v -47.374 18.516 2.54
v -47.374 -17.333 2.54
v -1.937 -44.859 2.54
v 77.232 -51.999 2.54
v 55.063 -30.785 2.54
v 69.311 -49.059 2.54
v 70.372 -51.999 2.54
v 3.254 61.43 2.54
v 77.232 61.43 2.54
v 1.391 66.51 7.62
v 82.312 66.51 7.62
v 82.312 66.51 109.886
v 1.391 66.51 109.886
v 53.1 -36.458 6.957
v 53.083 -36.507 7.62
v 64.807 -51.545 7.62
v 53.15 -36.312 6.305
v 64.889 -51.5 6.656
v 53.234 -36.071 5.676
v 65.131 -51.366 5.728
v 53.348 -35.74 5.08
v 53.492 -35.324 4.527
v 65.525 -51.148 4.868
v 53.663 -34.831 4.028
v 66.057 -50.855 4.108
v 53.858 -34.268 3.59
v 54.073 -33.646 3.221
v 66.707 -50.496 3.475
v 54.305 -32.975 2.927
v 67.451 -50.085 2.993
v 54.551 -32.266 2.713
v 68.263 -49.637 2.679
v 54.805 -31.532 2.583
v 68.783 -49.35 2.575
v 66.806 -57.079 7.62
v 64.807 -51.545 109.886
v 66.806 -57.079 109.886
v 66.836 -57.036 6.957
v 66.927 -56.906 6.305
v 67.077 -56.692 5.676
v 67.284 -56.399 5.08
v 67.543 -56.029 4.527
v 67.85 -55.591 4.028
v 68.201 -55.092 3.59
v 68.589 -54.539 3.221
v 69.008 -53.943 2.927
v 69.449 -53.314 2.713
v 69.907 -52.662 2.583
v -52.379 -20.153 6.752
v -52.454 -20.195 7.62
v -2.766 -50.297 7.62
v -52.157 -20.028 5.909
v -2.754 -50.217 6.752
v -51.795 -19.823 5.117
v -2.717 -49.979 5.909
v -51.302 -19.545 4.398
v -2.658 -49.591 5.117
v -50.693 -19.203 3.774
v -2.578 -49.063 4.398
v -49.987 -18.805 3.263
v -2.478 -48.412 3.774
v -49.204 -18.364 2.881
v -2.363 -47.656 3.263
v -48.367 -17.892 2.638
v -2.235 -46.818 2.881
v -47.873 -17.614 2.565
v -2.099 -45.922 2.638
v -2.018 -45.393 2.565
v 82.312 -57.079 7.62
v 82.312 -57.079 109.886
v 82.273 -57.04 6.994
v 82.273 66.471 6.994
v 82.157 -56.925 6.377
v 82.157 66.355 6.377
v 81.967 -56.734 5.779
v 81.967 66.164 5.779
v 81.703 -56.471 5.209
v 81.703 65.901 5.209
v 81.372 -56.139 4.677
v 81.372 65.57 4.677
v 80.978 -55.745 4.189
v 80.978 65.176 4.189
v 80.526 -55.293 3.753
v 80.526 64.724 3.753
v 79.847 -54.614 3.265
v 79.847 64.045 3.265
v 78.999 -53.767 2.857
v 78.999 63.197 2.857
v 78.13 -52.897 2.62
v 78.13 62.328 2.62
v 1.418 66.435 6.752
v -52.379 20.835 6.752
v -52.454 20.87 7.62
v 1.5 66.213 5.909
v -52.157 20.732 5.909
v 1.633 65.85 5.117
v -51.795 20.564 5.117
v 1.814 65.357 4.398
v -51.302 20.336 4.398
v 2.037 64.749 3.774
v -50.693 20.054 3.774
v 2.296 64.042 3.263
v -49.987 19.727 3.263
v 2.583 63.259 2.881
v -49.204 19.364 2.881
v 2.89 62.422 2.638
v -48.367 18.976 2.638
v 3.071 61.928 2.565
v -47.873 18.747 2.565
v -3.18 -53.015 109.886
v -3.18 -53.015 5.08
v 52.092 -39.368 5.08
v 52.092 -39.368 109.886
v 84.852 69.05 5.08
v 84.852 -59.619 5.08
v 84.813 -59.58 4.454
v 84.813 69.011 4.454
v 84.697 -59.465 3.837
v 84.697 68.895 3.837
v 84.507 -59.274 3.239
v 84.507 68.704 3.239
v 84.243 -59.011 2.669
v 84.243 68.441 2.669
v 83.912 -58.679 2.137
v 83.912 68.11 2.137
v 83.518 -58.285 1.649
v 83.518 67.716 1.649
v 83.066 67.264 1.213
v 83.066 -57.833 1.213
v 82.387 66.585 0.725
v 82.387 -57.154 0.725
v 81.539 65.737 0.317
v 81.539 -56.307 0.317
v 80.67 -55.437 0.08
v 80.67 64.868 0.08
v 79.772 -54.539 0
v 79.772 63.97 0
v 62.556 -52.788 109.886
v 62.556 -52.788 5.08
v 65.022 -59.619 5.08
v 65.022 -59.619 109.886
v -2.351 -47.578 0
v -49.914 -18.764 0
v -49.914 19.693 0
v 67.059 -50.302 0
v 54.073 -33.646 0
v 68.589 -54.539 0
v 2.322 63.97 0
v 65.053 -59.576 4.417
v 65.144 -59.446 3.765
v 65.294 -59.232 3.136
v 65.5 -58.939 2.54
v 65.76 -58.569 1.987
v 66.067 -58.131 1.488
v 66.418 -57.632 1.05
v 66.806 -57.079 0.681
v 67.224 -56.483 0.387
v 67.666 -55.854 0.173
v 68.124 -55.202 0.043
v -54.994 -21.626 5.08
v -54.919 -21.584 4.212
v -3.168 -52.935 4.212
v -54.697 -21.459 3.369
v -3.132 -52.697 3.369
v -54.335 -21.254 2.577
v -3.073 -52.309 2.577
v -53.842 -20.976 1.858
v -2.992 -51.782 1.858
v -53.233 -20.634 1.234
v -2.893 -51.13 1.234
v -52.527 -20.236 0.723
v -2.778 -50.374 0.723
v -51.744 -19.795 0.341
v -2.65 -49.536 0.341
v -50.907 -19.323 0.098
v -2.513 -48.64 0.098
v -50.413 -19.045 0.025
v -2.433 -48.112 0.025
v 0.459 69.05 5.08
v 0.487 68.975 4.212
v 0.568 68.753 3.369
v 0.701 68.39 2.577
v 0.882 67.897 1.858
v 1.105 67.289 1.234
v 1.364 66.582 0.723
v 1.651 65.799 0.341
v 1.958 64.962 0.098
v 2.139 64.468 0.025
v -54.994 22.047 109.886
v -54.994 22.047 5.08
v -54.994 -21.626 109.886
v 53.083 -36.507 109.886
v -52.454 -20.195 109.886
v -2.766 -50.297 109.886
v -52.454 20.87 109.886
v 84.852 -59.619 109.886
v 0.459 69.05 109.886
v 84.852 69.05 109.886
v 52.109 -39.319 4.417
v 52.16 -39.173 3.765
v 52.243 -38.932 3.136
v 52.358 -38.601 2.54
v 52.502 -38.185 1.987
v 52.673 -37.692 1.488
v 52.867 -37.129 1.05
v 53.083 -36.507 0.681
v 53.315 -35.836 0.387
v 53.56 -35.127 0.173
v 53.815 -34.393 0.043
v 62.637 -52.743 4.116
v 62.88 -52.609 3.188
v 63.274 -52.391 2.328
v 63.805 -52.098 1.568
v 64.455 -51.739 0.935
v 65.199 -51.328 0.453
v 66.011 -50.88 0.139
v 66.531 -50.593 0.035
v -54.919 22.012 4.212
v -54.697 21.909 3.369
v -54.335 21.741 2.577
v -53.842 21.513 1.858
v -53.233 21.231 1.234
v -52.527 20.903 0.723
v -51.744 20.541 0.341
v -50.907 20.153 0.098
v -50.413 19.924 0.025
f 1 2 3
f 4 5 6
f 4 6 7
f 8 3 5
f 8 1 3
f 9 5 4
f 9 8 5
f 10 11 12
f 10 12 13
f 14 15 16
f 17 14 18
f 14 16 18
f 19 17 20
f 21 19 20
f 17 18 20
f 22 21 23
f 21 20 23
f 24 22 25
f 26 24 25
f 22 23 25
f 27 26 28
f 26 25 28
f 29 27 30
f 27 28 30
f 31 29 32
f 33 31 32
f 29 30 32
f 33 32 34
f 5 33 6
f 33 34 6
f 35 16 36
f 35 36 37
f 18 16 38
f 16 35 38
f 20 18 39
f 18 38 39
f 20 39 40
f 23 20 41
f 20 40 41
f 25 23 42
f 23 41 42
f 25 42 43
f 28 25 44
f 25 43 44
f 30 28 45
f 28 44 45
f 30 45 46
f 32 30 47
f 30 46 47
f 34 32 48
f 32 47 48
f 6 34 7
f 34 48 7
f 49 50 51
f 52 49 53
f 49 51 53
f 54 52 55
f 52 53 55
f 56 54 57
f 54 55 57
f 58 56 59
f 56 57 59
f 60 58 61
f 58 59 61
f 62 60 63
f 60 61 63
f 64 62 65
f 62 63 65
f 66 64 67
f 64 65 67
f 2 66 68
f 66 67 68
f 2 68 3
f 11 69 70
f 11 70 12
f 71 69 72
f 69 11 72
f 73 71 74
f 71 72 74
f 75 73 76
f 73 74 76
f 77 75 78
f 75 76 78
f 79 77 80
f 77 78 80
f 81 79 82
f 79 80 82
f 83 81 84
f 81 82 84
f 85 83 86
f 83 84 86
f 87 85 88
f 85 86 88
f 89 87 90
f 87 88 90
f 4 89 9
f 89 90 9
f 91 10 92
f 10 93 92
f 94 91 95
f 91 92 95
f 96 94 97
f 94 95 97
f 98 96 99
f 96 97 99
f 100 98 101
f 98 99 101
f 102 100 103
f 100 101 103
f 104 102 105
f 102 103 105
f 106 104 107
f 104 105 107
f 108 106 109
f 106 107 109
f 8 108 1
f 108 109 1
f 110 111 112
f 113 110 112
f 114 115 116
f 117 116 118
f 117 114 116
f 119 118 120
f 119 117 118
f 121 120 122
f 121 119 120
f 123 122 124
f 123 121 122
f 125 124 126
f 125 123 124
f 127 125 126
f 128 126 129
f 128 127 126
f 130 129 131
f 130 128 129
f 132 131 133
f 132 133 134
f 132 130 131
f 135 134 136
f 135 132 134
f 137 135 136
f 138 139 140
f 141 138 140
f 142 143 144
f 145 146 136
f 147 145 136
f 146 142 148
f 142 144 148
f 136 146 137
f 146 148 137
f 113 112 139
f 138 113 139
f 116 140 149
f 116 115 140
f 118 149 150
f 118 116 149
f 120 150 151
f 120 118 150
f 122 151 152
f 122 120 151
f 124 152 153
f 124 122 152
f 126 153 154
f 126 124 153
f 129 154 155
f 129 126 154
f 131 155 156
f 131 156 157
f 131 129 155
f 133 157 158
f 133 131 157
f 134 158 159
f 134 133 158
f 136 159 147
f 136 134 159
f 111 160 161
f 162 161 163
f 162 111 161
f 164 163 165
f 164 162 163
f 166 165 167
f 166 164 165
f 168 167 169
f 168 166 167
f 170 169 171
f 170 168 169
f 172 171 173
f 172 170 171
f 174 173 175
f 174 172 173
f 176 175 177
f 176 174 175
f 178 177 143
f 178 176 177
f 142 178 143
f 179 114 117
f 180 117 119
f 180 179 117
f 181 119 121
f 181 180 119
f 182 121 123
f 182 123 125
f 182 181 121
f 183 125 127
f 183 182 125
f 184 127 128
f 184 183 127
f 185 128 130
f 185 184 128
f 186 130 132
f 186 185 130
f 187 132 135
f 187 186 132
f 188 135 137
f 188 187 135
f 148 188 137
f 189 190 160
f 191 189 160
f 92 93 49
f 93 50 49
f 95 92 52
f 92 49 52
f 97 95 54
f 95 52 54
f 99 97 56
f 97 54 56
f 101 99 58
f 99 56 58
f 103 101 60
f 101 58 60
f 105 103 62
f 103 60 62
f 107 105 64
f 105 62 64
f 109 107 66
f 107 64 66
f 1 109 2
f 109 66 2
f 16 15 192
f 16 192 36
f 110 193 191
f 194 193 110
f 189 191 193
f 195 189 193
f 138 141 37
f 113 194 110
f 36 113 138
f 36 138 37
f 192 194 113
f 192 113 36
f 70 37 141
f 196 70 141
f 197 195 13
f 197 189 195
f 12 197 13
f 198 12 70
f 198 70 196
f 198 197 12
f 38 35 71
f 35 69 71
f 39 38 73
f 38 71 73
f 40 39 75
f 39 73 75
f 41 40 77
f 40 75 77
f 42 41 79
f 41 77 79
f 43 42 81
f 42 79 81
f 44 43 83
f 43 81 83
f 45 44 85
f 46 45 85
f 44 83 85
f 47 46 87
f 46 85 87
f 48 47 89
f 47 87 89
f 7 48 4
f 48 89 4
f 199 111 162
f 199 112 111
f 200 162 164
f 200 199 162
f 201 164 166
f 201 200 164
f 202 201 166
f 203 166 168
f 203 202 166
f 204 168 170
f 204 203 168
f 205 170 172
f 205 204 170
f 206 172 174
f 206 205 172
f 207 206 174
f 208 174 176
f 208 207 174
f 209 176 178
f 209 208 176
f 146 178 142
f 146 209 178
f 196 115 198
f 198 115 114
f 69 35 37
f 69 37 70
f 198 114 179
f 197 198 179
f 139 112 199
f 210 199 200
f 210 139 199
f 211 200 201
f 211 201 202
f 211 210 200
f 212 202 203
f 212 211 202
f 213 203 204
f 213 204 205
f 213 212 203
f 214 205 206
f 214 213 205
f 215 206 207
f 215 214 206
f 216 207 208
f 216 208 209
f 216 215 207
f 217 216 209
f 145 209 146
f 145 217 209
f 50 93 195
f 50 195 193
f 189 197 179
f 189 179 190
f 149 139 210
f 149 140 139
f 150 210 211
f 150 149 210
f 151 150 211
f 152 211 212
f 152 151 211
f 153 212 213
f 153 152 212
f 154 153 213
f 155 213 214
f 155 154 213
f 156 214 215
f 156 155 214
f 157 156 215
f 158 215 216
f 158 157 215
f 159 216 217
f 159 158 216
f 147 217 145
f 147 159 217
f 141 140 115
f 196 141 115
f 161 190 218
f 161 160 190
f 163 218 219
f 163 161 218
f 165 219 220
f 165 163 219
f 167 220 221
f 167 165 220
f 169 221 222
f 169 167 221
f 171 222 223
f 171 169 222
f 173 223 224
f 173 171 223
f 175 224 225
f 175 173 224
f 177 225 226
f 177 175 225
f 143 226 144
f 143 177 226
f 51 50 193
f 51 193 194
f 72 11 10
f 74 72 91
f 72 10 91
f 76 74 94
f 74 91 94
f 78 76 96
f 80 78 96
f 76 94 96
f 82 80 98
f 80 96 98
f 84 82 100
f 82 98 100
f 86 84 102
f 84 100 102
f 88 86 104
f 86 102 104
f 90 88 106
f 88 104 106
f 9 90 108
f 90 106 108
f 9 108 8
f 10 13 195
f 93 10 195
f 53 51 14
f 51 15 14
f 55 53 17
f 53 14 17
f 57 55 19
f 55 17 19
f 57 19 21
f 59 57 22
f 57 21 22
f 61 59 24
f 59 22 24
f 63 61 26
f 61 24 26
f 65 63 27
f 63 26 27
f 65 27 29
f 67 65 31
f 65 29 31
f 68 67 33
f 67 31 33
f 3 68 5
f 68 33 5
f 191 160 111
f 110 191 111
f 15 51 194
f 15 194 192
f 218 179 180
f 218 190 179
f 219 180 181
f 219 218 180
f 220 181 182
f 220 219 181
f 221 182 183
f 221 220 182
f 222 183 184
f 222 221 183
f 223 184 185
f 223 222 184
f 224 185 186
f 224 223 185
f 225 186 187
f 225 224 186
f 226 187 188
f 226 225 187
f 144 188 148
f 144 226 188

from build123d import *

# Parameters (mm, degrees)
F1_DEPTH = 109.8860576749
F2_T     = -2.54
F3_R     = 5.08
F4_R     = 5.08


with BuildPart() as f1:
    # F0 (on Top) → F1 (new body)
    with BuildSketch(Plane.XY):
        Polygon((84.8518013954, -59.6191361547), (84.8518013954, 69.0497234464), (0.4590898752, 69.0497234464), (-54.9942553043, 22.0465362072), (-54.9942553043, -21.6257423162), (-3.1802803278, -53.0151873827), (52.0924478769, -39.3676012754), (62.5555962324, -52.7877360582), (65.0224879491, -59.6191361547), align=None)
    extrude(amount=F1_DEPTH)

    # F2
    f2_openings = [f1.faces().sort_by_distance(p)[0] for p in [
        (22.309592, 7.913715, 109.886058),
    ]]
    offset(amount=F2_T, openings=f2_openings, kind=Kind.INTERSECTION)

    # F3
    f3_edges = [f1.edges().sort_by_distance(p)[0] for p in [
        (74.558802, -57.079136, 2.54),
        (65.806549, -54.311968, 2.54),
        (58.945027, -44.025799, 2.54),
        (25.158494, -43.401678, 2.54),
        (-27.610013, -35.245657, 2.54),
        (-52.454255, 0.337522, 2.54),
        (-25.531758, 43.689762, 2.54),
        (41.85127, 66.509723, 2.54),
        (82.311801, 4.715294, 2.54),
    ]]
    fillet(f3_edges, radius=F3_R)

    # F4
    f4_edges = [f1.edges().sort_by_distance(p)[0] for p in [
        (84.851801, 4.715294, 0),
        (42.655446, 69.049723, 0),
        (-27.267583, 45.54813, 0),
        (-54.994255, 0.210397, 0),
        (-29.087268, -37.320465, 0),
        (24.456084, -46.191394, 0),
        (57.324022, -46.077669, 0),
        (63.789042, -56.203436, 0),
        (74.937145, -59.619136, 0),
    ]]
    fillet(f4_edges, radius=F4_R)


solid = f1.part
